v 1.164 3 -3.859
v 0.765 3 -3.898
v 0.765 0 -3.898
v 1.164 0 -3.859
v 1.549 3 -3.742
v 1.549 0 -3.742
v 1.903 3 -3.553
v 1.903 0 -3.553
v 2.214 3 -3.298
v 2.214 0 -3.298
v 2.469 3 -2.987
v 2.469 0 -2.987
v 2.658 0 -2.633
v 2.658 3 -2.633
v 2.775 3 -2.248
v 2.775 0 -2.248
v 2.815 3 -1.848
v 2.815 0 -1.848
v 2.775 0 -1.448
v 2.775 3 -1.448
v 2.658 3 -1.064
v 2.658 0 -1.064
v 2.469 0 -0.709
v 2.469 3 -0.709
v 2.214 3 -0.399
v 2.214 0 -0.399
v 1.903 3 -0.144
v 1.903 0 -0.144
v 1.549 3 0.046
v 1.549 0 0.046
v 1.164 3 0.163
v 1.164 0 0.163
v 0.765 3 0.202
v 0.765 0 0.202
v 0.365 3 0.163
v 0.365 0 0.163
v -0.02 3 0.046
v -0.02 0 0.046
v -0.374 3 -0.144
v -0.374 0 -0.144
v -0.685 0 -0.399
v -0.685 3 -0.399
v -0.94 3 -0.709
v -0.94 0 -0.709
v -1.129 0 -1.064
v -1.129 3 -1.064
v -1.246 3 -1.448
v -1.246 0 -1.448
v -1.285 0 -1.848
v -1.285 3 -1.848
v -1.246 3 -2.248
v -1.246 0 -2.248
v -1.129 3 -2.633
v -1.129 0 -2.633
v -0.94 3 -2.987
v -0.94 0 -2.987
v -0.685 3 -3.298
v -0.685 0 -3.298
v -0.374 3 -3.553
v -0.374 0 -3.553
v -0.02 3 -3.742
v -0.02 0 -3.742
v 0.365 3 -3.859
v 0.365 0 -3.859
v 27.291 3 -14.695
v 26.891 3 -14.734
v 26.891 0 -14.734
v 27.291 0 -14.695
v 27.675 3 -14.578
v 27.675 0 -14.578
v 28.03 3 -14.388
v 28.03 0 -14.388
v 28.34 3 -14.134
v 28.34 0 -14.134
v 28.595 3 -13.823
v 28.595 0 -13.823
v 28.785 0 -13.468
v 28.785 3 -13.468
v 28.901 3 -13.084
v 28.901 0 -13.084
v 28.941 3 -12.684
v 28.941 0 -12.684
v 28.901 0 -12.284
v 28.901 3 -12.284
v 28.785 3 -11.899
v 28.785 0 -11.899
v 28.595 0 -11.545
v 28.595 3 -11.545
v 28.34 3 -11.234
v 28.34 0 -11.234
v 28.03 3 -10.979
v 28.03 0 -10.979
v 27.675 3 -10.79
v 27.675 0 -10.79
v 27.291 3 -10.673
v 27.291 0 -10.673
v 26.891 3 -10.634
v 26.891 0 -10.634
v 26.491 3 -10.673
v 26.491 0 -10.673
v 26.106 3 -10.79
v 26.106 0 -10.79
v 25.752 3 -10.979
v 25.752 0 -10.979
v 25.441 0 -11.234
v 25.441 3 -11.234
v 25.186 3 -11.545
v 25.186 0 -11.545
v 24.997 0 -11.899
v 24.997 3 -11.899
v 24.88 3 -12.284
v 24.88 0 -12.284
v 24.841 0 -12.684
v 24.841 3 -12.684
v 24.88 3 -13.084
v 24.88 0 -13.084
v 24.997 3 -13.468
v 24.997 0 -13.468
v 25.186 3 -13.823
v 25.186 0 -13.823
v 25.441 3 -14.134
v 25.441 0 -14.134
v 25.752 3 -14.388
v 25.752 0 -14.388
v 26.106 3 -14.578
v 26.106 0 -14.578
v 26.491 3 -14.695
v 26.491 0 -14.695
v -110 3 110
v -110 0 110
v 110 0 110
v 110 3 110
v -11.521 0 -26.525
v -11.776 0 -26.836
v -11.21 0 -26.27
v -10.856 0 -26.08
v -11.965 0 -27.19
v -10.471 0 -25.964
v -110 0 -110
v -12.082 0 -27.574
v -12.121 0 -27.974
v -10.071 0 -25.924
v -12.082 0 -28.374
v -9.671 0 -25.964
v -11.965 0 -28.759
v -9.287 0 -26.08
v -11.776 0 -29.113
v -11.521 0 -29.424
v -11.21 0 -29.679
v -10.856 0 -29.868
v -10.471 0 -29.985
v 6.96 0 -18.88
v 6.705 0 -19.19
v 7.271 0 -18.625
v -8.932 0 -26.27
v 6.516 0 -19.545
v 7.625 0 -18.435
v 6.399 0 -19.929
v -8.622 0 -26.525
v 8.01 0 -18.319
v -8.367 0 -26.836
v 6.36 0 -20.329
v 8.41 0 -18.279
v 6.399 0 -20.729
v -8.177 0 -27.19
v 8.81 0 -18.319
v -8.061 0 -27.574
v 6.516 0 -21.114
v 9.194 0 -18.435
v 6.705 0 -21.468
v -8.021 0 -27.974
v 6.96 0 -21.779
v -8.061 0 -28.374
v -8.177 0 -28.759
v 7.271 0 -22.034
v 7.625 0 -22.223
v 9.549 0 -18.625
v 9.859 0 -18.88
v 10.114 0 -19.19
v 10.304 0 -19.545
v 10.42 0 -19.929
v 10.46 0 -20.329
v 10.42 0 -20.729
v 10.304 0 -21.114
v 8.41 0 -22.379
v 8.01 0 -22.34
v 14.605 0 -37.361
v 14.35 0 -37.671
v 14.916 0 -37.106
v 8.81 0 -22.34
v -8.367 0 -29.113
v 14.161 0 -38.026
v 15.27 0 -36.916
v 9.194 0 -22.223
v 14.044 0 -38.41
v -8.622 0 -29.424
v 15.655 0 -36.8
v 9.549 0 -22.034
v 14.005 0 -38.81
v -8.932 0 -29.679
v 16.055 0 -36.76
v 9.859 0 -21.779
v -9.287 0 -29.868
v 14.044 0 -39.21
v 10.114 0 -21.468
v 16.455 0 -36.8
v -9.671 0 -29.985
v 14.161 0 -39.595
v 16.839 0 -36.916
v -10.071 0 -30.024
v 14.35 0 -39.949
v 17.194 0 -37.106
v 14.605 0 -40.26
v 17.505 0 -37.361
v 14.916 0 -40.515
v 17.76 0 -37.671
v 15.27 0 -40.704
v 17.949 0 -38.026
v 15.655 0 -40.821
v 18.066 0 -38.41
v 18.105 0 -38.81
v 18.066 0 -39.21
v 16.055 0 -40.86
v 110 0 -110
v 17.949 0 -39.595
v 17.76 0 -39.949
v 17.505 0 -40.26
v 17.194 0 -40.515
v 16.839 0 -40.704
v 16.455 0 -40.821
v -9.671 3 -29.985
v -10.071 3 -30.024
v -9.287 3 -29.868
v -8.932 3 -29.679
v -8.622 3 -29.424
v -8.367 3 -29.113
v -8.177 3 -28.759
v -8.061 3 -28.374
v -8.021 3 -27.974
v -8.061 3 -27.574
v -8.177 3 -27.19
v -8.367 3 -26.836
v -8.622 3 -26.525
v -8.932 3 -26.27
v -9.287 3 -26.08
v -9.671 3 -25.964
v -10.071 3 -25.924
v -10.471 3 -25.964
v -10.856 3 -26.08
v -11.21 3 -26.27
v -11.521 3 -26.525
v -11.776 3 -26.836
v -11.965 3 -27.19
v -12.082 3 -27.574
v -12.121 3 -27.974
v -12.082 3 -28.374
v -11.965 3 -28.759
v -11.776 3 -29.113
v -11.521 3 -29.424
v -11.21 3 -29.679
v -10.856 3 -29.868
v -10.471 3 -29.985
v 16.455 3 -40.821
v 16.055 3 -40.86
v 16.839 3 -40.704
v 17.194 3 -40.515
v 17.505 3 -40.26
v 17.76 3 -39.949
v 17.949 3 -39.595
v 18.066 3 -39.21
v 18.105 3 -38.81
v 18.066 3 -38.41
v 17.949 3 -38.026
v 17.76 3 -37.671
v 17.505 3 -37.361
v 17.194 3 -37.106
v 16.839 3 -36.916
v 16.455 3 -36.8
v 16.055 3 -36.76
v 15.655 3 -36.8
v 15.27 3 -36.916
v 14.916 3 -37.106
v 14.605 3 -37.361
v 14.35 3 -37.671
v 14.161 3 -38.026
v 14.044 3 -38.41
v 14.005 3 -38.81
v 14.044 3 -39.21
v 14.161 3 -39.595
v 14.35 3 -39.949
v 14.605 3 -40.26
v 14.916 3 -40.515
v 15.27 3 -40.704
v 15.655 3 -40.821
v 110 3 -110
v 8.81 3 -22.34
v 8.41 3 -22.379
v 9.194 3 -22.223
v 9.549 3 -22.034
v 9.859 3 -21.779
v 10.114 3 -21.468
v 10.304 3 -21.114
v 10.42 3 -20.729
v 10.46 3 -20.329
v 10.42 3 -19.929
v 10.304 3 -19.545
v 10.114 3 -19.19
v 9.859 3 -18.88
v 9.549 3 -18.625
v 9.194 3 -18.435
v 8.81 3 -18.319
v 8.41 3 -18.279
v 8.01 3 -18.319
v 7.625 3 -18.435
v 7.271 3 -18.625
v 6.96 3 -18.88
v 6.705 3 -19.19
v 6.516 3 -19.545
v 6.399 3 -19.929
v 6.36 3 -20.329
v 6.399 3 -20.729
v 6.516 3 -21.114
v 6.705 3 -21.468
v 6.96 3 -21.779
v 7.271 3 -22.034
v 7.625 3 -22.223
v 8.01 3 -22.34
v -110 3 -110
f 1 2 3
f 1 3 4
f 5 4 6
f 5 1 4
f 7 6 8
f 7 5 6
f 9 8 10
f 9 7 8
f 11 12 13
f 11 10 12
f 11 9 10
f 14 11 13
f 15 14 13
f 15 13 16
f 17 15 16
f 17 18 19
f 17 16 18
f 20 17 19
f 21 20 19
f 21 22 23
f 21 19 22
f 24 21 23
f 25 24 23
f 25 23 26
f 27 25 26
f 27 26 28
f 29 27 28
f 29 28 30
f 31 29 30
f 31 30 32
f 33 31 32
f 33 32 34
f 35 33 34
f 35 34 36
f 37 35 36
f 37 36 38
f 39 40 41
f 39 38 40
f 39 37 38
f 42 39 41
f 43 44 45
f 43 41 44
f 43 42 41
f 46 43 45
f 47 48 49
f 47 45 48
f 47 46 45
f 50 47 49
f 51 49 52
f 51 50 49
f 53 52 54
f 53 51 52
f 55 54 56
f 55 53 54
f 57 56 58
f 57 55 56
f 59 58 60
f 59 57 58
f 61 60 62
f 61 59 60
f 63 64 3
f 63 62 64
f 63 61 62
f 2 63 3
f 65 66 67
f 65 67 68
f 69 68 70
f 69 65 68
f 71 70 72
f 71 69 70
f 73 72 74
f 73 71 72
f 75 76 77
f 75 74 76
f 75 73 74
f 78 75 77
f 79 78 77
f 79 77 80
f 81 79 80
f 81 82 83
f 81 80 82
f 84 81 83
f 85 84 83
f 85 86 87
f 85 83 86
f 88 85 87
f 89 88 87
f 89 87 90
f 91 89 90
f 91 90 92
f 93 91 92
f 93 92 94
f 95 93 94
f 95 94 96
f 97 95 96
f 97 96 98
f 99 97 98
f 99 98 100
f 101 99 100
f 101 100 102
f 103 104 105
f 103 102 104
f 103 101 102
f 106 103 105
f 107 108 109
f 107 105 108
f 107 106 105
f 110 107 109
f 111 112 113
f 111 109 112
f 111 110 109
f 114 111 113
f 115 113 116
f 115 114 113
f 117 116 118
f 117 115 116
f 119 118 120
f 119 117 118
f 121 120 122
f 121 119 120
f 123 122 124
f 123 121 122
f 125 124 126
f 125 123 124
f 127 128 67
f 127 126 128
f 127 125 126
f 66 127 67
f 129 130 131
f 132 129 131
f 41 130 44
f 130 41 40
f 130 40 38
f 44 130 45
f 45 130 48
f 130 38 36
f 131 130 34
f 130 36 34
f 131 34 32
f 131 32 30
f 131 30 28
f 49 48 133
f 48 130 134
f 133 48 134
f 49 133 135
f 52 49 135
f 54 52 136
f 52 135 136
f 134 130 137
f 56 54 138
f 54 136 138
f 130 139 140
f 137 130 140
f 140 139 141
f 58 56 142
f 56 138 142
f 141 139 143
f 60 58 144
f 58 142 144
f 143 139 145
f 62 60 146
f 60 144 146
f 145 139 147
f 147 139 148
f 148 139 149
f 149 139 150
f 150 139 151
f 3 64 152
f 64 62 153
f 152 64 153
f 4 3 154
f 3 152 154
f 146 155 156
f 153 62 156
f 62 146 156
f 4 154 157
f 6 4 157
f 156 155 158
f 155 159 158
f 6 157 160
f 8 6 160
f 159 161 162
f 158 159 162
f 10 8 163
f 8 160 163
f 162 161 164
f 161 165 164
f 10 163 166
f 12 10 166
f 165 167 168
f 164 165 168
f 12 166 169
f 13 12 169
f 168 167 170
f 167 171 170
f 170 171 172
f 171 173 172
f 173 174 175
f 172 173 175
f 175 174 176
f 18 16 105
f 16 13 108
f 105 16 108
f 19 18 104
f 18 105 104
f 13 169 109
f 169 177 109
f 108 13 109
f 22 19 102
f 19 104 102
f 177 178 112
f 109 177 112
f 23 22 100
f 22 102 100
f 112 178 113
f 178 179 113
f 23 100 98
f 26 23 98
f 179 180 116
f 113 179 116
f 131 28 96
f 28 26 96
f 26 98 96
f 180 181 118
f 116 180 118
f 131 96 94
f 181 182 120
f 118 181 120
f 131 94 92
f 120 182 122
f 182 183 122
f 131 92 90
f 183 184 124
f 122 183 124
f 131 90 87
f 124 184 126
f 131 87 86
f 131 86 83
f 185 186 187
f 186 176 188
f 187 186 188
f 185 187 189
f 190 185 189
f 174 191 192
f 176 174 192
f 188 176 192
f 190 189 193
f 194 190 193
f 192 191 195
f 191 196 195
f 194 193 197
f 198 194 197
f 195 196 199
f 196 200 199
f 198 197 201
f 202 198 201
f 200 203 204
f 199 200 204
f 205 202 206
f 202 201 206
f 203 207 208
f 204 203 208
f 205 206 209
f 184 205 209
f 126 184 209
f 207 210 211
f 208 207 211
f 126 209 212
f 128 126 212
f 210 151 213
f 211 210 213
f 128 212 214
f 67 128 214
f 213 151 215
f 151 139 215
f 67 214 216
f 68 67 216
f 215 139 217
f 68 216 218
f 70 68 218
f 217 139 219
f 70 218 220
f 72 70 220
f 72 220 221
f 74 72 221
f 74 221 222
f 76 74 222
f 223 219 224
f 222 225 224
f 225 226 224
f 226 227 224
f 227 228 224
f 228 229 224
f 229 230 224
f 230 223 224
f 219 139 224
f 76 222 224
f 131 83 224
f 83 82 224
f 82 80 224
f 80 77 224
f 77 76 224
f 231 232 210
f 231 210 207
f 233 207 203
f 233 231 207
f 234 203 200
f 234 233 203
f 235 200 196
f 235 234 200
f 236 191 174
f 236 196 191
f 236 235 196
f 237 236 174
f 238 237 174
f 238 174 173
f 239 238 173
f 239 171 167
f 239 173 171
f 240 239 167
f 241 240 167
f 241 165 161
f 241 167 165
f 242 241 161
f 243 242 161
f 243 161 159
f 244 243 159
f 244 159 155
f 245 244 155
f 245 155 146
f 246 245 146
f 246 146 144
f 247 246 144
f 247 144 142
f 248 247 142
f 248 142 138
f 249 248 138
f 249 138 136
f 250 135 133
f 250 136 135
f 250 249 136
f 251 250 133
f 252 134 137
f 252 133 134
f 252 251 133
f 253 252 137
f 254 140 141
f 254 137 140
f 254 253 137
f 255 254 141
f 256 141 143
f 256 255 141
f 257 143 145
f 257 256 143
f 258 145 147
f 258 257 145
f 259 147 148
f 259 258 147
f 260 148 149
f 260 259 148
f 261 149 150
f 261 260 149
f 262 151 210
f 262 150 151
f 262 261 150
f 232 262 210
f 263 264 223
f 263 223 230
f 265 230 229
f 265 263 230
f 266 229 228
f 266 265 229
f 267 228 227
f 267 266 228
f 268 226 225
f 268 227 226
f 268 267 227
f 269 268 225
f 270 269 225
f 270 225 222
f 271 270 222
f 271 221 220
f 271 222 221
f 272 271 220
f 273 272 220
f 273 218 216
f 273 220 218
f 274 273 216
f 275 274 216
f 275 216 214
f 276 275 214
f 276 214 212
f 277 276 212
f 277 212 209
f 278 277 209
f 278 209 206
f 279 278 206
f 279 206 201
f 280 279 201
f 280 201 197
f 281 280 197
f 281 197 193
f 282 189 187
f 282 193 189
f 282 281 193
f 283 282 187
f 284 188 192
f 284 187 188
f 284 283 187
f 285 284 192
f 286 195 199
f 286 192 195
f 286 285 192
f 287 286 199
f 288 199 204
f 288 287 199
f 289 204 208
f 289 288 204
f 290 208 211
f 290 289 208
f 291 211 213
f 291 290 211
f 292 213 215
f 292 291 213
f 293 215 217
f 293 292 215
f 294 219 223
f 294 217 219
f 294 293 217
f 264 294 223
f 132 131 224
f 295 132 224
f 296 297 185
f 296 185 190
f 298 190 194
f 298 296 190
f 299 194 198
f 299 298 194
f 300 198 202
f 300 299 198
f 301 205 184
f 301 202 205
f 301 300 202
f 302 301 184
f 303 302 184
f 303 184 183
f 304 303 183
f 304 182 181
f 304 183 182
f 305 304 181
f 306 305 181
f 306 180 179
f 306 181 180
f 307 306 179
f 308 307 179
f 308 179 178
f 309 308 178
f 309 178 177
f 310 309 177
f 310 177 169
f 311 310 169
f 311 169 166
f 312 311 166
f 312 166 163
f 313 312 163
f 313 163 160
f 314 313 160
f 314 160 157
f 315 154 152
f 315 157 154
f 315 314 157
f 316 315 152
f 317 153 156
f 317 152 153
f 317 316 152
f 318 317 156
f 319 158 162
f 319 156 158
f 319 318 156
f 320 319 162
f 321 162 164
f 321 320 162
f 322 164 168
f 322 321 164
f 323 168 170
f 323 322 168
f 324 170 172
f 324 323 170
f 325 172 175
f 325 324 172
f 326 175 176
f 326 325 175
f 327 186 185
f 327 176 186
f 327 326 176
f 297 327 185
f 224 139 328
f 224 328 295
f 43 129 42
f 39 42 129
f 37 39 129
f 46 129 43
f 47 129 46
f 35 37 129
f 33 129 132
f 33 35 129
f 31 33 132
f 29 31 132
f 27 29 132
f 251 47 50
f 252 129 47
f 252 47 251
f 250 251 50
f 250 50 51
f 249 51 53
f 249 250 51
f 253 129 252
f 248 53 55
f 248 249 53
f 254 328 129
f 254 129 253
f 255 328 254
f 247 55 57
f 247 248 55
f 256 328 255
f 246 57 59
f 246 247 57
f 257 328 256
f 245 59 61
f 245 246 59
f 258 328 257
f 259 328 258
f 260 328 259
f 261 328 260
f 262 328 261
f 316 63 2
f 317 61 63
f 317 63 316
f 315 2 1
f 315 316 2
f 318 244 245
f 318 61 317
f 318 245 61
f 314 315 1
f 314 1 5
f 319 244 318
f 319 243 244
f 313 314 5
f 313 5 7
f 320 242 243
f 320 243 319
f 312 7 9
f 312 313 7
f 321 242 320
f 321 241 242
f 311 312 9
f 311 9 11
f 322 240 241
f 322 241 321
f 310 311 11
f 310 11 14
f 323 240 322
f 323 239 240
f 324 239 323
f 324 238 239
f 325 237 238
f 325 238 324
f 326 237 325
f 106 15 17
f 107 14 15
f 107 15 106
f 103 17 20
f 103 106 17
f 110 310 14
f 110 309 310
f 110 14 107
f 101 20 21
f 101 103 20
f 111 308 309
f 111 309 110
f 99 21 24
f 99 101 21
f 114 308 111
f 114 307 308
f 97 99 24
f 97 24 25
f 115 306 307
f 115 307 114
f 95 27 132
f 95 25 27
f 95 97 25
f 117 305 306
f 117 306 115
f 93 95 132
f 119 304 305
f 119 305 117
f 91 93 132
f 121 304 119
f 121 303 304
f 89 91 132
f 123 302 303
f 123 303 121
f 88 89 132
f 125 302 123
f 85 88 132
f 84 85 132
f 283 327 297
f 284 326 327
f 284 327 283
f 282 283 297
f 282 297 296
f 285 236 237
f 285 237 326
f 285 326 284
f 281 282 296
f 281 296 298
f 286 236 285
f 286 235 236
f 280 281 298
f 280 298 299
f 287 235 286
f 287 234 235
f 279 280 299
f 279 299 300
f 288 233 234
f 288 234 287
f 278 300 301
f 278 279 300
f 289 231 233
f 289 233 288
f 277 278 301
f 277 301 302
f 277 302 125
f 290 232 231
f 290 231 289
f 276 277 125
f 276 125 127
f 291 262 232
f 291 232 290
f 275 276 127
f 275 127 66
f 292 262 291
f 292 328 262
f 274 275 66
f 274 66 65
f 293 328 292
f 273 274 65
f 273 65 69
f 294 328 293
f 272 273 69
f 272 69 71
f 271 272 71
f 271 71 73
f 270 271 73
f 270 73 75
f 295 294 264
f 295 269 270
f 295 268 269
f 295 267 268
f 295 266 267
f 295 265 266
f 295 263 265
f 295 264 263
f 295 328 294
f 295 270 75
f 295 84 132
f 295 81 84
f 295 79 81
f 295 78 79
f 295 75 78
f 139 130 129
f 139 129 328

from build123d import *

# Parameters (mm, degrees)
SKETCH_1_W               = 220
SKETCH_1_H               = 220
EXTRUDE_1_DEPTH          = 3
CUT_EXTRUDE_1_DEPTH      = 156.592416268
CUT_EXTRUDE_1_DEPTH_BACK = 156.592416268
SKETCH_3_R               = 2.05


with BuildPart() as part:
    # 草图1 → 凸台-拉伸1 (new body)
    with BuildSketch(Plane(origin=(0, 0, 0), x_dir=(1, 0, 0), z_dir=(0, 1, 0))):
        Rectangle(SKETCH_1_W, SKETCH_1_H)
    extrude(amount=EXTRUDE_1_DEPTH)

    # 草图3 → 切除-拉伸1 (cut, two sides: drawn at the far end of the back side and taken through both)
    with BuildSketch(Plane.XZ.offset(-CUT_EXTRUDE_1_DEPTH_BACK)):
        with Locations(Location((16.054996524, -38.810270375, 0), (0, 0, 270))):
            Circle(SKETCH_3_R)
        with Locations(Location((8.409760084, -20.329189244, 0), (0, 0, 270))):
            Circle(SKETCH_3_R)
        with Locations(Location((26.890841215, -12.683952804, 0), (0, 0, 270))):
            Circle(SKETCH_3_R)
        with Locations(Location((0.764523644, -1.848108113, 0), (0, 0, 270))):
            Circle(SKETCH_3_R)
        with Locations(Location((-10.071321047, -27.974425684, 0), (0, 0, 270))):
            Circle(SKETCH_3_R)
    extrude(amount=CUT_EXTRUDE_1_DEPTH + CUT_EXTRUDE_1_DEPTH_BACK, mode=Mode.SUBTRACT)


solid = part.part
